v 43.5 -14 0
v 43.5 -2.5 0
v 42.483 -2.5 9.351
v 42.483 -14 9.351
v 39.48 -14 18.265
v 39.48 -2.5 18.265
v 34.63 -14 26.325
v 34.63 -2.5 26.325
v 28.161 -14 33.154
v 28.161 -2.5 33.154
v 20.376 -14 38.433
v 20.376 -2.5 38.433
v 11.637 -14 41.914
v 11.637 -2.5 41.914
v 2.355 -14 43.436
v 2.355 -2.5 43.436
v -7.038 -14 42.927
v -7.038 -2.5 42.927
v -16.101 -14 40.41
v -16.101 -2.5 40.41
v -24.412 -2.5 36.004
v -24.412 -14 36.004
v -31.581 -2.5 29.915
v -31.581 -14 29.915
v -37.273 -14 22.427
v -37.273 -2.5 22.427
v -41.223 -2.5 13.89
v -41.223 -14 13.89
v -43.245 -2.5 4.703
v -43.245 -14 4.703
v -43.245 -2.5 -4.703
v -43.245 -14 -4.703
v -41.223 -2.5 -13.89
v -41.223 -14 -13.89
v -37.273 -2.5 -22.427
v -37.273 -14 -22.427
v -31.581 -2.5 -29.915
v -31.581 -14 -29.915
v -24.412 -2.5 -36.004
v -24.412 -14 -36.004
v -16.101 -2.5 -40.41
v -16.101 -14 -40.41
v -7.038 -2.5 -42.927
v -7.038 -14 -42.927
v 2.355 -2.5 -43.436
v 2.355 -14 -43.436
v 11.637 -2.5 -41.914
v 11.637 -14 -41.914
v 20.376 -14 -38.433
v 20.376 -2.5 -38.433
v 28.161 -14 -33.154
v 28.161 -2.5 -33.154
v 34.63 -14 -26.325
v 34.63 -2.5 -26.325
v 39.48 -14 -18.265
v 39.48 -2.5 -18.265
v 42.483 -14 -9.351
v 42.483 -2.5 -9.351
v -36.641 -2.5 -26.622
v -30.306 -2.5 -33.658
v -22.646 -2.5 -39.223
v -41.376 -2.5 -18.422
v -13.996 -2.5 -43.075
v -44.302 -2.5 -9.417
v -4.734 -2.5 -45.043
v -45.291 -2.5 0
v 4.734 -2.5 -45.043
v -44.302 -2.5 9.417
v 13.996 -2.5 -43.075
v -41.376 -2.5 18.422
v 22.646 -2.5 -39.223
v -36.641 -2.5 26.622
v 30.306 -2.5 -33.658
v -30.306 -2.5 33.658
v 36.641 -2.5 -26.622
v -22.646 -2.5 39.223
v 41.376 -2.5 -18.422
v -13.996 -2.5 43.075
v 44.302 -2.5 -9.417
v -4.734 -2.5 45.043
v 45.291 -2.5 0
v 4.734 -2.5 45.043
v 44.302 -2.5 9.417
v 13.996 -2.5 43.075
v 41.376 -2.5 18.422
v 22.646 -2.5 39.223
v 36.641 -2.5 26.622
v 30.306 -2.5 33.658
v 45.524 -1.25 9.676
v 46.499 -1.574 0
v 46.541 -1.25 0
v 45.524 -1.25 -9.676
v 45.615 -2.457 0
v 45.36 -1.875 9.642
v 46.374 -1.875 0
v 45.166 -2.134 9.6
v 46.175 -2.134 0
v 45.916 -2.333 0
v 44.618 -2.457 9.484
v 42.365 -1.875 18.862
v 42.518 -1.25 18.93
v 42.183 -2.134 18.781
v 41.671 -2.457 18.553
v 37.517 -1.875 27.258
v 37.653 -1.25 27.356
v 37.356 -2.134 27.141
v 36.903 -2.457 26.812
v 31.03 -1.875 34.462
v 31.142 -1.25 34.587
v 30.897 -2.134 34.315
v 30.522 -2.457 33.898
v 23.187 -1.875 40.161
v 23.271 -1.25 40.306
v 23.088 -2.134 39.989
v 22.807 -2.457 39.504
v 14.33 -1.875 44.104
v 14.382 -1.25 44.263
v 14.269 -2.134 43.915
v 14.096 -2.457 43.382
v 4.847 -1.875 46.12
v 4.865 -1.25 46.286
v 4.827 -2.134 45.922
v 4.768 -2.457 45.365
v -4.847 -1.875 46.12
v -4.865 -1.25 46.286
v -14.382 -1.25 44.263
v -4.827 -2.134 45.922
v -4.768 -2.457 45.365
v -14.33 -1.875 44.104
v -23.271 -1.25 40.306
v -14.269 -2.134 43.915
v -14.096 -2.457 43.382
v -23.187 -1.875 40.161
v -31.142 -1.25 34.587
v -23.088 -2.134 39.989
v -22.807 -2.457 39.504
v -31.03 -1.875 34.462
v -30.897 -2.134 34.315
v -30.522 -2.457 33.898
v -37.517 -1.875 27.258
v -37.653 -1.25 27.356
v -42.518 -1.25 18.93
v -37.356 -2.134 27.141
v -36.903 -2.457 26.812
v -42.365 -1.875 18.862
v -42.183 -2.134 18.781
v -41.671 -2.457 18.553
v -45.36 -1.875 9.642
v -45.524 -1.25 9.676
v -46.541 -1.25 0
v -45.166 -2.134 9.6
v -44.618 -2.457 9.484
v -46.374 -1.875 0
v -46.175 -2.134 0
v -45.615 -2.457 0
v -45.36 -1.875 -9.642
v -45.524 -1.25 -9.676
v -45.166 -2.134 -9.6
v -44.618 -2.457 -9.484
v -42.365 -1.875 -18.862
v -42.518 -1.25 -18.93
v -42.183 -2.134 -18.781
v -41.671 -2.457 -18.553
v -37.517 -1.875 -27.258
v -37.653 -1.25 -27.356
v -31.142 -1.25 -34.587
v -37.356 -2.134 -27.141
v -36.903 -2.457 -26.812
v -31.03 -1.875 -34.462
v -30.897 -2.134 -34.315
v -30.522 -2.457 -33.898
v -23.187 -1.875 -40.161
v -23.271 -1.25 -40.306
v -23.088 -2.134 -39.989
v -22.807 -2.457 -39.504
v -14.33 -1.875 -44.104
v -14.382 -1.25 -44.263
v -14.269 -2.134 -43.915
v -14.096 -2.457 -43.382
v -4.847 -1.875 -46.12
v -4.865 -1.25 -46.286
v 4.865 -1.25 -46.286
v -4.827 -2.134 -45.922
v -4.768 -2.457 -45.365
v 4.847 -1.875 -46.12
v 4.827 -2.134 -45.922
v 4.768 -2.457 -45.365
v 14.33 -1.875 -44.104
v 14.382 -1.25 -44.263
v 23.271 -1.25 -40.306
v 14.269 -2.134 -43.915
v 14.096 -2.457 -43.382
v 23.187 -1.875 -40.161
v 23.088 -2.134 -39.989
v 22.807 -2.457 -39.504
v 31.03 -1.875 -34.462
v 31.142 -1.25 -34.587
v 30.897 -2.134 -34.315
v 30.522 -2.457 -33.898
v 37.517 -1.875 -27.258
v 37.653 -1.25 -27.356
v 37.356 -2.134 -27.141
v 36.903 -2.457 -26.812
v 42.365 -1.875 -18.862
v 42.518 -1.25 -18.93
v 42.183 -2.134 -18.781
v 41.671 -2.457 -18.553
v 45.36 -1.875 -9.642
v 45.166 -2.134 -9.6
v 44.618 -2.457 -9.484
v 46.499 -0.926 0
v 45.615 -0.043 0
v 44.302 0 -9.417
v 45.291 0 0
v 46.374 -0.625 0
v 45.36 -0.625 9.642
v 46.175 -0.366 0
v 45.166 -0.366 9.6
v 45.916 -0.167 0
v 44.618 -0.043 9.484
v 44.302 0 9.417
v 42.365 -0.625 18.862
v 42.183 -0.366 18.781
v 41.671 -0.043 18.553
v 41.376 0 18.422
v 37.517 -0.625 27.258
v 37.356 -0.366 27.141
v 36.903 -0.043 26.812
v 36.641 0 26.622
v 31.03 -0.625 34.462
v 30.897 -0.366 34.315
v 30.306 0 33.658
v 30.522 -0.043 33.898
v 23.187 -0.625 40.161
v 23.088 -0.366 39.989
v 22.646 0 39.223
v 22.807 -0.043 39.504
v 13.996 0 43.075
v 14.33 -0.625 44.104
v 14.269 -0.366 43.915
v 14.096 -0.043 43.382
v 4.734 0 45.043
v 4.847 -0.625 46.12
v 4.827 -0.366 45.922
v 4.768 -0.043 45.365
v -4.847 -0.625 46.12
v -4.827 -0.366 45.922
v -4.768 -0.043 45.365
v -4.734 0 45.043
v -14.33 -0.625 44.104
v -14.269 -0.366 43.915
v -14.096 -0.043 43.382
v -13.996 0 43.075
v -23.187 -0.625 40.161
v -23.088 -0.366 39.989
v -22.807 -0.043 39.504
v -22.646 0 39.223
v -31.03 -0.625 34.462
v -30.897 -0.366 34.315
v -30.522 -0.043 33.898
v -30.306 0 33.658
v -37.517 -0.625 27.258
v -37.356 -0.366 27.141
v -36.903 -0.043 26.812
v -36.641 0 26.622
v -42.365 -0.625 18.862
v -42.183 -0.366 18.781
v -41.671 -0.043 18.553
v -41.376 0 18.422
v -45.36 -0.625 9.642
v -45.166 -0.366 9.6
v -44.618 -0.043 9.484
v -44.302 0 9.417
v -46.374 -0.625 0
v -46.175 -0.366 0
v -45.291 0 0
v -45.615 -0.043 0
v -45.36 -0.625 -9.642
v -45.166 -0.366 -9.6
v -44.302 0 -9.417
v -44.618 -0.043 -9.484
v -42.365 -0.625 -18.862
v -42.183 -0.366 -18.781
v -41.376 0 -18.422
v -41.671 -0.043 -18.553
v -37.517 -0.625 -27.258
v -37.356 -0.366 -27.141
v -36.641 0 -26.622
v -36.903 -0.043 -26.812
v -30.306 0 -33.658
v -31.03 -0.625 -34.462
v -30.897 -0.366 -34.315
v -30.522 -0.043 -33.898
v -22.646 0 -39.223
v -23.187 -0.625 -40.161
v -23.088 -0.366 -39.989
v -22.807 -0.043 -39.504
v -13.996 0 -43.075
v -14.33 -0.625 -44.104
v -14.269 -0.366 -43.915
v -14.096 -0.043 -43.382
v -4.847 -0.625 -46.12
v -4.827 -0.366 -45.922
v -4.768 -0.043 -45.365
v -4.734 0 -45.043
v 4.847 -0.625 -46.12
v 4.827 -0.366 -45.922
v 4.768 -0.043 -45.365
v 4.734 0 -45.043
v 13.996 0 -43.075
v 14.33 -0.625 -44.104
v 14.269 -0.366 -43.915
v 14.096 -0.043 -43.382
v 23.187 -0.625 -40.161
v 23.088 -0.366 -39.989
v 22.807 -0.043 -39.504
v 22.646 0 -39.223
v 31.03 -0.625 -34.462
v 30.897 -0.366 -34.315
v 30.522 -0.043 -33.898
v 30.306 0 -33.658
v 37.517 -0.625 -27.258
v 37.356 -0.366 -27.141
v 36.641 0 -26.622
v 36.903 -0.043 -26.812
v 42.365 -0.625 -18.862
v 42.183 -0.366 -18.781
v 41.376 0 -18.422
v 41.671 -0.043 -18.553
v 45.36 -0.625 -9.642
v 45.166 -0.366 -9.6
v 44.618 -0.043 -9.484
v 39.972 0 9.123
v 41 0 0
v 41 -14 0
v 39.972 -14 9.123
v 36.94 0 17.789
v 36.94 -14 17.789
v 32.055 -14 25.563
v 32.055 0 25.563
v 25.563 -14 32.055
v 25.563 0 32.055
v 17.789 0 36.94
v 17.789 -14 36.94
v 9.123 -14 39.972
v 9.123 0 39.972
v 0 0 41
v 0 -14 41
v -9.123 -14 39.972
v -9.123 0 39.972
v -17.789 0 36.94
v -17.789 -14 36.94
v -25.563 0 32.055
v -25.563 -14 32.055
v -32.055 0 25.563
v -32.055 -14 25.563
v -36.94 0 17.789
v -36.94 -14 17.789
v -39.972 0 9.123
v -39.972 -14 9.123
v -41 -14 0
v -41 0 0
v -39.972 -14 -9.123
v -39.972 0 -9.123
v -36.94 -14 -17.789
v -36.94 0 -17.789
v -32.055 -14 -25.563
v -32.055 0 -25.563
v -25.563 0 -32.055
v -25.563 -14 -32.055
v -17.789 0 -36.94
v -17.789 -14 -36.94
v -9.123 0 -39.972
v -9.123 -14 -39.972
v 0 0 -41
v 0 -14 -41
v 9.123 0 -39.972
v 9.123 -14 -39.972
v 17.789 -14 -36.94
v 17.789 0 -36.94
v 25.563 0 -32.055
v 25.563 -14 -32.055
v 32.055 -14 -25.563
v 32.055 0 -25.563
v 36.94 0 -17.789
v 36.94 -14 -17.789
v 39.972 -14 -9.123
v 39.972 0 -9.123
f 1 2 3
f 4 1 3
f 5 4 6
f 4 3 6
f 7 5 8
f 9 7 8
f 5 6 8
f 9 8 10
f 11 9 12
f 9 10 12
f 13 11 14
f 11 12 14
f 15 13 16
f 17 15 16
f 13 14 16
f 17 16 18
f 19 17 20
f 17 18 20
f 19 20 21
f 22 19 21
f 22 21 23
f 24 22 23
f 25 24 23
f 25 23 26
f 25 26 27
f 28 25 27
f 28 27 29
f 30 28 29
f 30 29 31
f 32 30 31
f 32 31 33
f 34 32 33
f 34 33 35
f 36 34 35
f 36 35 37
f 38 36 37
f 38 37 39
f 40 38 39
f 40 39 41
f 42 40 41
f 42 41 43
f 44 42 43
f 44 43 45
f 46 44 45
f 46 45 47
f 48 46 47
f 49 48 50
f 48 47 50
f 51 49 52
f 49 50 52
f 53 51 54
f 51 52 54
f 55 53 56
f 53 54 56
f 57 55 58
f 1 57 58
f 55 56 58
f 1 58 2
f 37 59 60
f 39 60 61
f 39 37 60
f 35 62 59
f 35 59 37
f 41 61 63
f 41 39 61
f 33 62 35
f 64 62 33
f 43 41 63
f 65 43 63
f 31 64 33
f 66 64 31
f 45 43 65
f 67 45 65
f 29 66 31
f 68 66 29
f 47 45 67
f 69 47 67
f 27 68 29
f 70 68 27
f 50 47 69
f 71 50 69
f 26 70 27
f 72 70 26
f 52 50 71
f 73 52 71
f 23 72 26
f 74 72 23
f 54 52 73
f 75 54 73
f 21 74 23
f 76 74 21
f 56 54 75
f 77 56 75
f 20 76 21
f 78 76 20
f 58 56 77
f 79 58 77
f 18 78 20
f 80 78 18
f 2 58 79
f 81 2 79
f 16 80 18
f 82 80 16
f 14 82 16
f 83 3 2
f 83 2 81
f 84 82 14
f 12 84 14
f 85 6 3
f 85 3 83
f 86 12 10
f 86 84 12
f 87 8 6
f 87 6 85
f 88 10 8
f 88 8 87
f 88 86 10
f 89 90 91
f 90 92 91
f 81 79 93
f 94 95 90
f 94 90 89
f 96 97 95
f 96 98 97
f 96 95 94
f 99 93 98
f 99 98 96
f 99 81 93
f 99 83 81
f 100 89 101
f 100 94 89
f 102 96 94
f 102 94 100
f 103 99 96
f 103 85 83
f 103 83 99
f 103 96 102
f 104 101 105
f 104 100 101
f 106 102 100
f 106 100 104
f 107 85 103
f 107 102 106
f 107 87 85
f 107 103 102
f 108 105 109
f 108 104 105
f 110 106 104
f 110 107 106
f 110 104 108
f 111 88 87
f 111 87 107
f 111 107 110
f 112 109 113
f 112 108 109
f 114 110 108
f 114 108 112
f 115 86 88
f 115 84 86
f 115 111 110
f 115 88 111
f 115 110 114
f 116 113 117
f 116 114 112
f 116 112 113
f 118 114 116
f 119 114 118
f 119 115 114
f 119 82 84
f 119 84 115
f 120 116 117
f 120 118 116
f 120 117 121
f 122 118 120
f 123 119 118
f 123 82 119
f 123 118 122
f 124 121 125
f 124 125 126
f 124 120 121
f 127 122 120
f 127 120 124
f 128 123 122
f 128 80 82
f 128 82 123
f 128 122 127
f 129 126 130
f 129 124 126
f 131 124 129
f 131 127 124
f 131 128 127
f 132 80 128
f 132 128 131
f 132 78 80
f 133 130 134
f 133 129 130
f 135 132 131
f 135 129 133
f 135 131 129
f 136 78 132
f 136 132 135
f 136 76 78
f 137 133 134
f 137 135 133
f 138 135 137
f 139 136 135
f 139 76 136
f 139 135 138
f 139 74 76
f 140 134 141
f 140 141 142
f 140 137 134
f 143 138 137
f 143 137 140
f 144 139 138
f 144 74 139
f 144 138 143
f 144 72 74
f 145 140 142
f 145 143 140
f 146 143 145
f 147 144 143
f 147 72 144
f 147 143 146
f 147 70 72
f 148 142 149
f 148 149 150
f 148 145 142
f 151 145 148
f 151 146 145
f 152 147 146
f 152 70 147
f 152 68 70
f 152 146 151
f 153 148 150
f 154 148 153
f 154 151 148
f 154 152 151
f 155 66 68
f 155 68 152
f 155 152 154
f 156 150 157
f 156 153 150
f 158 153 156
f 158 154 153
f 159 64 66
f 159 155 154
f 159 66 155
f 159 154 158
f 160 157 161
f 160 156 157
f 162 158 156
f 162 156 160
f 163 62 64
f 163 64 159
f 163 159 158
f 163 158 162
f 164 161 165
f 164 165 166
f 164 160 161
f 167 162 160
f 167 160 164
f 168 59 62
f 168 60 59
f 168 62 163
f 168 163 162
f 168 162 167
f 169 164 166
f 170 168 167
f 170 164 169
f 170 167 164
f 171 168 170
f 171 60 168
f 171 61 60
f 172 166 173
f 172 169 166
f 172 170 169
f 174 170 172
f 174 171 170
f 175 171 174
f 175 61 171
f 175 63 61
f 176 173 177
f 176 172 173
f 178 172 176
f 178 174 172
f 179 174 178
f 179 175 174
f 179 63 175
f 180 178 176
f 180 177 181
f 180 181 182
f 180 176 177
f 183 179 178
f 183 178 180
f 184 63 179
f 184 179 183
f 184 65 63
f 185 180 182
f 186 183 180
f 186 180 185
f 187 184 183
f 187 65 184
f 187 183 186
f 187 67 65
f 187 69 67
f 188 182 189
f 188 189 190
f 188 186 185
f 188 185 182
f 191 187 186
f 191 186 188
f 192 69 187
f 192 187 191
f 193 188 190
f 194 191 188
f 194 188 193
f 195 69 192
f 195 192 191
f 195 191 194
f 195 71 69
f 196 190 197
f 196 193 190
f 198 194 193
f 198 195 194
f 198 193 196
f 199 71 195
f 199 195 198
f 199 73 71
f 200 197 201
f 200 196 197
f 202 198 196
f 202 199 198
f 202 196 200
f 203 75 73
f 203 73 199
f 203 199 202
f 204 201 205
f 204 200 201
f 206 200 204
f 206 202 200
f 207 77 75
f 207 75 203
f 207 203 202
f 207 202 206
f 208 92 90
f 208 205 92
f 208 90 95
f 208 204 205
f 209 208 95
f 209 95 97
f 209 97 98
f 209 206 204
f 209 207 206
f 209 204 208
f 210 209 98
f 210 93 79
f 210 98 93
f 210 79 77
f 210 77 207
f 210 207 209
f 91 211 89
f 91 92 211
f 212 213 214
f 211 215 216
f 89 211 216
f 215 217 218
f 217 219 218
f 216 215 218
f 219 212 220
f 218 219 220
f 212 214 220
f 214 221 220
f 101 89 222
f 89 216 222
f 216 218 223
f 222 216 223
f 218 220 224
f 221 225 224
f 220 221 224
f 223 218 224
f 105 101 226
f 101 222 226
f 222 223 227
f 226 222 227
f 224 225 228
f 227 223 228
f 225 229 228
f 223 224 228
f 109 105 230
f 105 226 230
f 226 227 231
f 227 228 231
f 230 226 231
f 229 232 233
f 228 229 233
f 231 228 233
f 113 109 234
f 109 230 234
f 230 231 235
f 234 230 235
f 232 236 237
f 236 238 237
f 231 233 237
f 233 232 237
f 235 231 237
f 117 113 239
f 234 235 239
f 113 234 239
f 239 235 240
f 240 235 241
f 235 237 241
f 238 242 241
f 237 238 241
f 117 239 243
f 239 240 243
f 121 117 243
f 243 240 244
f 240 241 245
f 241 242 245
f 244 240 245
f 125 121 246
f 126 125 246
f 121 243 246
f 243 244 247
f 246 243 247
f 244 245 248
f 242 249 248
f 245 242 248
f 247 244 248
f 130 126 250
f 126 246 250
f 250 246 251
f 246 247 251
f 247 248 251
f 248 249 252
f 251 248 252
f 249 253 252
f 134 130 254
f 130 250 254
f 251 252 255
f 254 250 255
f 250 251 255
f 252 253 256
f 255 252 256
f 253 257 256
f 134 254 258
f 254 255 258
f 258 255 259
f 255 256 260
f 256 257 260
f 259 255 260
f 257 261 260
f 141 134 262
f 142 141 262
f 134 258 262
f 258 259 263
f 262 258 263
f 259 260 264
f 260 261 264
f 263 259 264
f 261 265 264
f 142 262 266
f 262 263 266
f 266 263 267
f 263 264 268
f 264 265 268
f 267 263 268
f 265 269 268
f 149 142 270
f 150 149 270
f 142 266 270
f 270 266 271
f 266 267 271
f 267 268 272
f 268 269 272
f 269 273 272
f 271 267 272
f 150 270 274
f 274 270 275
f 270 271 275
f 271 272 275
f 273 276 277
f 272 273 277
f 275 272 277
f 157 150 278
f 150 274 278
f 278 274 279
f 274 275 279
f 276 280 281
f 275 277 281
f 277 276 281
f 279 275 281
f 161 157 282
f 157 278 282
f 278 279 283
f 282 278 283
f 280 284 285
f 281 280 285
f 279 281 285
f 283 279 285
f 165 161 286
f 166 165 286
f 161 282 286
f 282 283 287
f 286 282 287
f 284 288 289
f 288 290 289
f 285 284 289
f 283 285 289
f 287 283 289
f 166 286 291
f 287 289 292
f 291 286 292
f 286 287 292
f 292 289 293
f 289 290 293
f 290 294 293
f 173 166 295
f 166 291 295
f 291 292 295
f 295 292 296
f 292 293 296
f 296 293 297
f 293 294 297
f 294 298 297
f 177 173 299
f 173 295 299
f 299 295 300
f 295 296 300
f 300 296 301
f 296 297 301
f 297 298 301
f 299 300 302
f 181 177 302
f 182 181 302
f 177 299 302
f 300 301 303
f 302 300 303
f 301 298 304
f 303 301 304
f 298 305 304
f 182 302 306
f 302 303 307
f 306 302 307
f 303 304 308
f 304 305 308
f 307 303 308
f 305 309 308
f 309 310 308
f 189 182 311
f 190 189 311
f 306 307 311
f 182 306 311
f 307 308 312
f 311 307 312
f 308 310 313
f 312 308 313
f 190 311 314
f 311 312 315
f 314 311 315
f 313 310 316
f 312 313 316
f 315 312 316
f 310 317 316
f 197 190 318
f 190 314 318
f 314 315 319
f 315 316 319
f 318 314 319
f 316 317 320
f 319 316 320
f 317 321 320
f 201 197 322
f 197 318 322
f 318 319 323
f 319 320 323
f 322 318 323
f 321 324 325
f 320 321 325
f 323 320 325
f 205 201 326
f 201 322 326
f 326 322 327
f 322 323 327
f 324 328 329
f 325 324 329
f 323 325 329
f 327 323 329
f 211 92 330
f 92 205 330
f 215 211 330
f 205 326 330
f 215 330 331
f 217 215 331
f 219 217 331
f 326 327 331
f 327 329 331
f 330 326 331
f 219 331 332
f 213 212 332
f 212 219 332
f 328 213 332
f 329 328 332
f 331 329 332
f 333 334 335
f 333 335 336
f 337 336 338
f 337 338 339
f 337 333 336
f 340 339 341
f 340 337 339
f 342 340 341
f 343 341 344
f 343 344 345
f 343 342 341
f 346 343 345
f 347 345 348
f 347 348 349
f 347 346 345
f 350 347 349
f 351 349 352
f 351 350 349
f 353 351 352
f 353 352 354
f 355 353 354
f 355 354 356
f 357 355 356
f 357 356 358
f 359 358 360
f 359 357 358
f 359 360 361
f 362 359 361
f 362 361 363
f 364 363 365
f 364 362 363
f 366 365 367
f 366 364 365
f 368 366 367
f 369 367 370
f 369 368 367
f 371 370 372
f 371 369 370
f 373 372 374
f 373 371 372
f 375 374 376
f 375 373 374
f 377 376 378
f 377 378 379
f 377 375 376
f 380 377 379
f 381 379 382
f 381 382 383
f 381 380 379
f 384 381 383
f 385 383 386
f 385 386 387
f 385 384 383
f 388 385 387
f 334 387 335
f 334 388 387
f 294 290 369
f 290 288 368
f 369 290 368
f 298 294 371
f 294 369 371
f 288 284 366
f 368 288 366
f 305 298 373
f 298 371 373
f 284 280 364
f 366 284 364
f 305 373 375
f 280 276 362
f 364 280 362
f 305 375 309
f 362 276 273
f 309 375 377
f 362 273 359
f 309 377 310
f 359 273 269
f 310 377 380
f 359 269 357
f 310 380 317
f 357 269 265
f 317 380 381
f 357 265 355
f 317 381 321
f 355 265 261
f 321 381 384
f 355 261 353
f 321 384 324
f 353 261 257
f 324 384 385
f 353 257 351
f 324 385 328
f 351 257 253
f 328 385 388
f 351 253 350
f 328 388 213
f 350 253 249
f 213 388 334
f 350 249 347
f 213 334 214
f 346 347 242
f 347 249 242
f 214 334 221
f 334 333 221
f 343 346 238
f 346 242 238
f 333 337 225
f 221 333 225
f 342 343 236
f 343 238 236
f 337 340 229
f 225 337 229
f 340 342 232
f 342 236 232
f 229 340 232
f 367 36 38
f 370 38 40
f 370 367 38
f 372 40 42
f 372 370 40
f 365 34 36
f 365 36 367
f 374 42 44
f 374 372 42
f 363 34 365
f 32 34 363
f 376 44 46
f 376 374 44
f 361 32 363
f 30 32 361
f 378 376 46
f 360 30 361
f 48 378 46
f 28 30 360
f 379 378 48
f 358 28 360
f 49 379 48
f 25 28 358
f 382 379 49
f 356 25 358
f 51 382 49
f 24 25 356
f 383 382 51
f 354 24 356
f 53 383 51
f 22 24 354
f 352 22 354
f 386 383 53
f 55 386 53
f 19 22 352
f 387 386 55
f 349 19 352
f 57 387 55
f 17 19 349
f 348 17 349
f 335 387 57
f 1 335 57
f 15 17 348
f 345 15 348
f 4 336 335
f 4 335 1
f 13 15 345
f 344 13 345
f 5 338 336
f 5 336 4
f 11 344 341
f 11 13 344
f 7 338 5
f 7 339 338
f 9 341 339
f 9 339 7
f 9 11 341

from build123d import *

# Parameters (mm, degrees)
F0_R     = 43.5
F0_R_2   = 41
F1_DEPTH = 14
F0_R_3   = 46.5412209473
F2_DEPTH = 2.5
F3_R     = 1.24999


# Not quite as in the source:
# - a fillet or chamfer is up to 0.001 mm smaller than in the source, because OpenCascade refuses the exact size


with BuildPart() as f1:
    # F0 (on Front) → F1 (new body)
    with BuildSketch(Plane.XZ):
        Circle(F0_R)
        Circle(F0_R_2, mode=Mode.SUBTRACT)
    extrude(amount=F1_DEPTH)

    # F0 (on Front) → F2 (join)
    with BuildSketch(Plane.XZ):
        Circle(F0_R_3)
        Circle(F0_R, mode=Mode.SUBTRACT)
    extrude(amount=F2_DEPTH)

    # F3 (radius 1.25 in the source; OpenCascade refuses exactly that, so slightly less here)
    f3_edges = [f1.edges().sort_by_distance(p)[0] for p in [
        (-46.541221, -2.5, 0),
        (-46.541221, 0, 0),
    ]]
    fillet(f3_edges, radius=F3_R)


solid = f1.part
